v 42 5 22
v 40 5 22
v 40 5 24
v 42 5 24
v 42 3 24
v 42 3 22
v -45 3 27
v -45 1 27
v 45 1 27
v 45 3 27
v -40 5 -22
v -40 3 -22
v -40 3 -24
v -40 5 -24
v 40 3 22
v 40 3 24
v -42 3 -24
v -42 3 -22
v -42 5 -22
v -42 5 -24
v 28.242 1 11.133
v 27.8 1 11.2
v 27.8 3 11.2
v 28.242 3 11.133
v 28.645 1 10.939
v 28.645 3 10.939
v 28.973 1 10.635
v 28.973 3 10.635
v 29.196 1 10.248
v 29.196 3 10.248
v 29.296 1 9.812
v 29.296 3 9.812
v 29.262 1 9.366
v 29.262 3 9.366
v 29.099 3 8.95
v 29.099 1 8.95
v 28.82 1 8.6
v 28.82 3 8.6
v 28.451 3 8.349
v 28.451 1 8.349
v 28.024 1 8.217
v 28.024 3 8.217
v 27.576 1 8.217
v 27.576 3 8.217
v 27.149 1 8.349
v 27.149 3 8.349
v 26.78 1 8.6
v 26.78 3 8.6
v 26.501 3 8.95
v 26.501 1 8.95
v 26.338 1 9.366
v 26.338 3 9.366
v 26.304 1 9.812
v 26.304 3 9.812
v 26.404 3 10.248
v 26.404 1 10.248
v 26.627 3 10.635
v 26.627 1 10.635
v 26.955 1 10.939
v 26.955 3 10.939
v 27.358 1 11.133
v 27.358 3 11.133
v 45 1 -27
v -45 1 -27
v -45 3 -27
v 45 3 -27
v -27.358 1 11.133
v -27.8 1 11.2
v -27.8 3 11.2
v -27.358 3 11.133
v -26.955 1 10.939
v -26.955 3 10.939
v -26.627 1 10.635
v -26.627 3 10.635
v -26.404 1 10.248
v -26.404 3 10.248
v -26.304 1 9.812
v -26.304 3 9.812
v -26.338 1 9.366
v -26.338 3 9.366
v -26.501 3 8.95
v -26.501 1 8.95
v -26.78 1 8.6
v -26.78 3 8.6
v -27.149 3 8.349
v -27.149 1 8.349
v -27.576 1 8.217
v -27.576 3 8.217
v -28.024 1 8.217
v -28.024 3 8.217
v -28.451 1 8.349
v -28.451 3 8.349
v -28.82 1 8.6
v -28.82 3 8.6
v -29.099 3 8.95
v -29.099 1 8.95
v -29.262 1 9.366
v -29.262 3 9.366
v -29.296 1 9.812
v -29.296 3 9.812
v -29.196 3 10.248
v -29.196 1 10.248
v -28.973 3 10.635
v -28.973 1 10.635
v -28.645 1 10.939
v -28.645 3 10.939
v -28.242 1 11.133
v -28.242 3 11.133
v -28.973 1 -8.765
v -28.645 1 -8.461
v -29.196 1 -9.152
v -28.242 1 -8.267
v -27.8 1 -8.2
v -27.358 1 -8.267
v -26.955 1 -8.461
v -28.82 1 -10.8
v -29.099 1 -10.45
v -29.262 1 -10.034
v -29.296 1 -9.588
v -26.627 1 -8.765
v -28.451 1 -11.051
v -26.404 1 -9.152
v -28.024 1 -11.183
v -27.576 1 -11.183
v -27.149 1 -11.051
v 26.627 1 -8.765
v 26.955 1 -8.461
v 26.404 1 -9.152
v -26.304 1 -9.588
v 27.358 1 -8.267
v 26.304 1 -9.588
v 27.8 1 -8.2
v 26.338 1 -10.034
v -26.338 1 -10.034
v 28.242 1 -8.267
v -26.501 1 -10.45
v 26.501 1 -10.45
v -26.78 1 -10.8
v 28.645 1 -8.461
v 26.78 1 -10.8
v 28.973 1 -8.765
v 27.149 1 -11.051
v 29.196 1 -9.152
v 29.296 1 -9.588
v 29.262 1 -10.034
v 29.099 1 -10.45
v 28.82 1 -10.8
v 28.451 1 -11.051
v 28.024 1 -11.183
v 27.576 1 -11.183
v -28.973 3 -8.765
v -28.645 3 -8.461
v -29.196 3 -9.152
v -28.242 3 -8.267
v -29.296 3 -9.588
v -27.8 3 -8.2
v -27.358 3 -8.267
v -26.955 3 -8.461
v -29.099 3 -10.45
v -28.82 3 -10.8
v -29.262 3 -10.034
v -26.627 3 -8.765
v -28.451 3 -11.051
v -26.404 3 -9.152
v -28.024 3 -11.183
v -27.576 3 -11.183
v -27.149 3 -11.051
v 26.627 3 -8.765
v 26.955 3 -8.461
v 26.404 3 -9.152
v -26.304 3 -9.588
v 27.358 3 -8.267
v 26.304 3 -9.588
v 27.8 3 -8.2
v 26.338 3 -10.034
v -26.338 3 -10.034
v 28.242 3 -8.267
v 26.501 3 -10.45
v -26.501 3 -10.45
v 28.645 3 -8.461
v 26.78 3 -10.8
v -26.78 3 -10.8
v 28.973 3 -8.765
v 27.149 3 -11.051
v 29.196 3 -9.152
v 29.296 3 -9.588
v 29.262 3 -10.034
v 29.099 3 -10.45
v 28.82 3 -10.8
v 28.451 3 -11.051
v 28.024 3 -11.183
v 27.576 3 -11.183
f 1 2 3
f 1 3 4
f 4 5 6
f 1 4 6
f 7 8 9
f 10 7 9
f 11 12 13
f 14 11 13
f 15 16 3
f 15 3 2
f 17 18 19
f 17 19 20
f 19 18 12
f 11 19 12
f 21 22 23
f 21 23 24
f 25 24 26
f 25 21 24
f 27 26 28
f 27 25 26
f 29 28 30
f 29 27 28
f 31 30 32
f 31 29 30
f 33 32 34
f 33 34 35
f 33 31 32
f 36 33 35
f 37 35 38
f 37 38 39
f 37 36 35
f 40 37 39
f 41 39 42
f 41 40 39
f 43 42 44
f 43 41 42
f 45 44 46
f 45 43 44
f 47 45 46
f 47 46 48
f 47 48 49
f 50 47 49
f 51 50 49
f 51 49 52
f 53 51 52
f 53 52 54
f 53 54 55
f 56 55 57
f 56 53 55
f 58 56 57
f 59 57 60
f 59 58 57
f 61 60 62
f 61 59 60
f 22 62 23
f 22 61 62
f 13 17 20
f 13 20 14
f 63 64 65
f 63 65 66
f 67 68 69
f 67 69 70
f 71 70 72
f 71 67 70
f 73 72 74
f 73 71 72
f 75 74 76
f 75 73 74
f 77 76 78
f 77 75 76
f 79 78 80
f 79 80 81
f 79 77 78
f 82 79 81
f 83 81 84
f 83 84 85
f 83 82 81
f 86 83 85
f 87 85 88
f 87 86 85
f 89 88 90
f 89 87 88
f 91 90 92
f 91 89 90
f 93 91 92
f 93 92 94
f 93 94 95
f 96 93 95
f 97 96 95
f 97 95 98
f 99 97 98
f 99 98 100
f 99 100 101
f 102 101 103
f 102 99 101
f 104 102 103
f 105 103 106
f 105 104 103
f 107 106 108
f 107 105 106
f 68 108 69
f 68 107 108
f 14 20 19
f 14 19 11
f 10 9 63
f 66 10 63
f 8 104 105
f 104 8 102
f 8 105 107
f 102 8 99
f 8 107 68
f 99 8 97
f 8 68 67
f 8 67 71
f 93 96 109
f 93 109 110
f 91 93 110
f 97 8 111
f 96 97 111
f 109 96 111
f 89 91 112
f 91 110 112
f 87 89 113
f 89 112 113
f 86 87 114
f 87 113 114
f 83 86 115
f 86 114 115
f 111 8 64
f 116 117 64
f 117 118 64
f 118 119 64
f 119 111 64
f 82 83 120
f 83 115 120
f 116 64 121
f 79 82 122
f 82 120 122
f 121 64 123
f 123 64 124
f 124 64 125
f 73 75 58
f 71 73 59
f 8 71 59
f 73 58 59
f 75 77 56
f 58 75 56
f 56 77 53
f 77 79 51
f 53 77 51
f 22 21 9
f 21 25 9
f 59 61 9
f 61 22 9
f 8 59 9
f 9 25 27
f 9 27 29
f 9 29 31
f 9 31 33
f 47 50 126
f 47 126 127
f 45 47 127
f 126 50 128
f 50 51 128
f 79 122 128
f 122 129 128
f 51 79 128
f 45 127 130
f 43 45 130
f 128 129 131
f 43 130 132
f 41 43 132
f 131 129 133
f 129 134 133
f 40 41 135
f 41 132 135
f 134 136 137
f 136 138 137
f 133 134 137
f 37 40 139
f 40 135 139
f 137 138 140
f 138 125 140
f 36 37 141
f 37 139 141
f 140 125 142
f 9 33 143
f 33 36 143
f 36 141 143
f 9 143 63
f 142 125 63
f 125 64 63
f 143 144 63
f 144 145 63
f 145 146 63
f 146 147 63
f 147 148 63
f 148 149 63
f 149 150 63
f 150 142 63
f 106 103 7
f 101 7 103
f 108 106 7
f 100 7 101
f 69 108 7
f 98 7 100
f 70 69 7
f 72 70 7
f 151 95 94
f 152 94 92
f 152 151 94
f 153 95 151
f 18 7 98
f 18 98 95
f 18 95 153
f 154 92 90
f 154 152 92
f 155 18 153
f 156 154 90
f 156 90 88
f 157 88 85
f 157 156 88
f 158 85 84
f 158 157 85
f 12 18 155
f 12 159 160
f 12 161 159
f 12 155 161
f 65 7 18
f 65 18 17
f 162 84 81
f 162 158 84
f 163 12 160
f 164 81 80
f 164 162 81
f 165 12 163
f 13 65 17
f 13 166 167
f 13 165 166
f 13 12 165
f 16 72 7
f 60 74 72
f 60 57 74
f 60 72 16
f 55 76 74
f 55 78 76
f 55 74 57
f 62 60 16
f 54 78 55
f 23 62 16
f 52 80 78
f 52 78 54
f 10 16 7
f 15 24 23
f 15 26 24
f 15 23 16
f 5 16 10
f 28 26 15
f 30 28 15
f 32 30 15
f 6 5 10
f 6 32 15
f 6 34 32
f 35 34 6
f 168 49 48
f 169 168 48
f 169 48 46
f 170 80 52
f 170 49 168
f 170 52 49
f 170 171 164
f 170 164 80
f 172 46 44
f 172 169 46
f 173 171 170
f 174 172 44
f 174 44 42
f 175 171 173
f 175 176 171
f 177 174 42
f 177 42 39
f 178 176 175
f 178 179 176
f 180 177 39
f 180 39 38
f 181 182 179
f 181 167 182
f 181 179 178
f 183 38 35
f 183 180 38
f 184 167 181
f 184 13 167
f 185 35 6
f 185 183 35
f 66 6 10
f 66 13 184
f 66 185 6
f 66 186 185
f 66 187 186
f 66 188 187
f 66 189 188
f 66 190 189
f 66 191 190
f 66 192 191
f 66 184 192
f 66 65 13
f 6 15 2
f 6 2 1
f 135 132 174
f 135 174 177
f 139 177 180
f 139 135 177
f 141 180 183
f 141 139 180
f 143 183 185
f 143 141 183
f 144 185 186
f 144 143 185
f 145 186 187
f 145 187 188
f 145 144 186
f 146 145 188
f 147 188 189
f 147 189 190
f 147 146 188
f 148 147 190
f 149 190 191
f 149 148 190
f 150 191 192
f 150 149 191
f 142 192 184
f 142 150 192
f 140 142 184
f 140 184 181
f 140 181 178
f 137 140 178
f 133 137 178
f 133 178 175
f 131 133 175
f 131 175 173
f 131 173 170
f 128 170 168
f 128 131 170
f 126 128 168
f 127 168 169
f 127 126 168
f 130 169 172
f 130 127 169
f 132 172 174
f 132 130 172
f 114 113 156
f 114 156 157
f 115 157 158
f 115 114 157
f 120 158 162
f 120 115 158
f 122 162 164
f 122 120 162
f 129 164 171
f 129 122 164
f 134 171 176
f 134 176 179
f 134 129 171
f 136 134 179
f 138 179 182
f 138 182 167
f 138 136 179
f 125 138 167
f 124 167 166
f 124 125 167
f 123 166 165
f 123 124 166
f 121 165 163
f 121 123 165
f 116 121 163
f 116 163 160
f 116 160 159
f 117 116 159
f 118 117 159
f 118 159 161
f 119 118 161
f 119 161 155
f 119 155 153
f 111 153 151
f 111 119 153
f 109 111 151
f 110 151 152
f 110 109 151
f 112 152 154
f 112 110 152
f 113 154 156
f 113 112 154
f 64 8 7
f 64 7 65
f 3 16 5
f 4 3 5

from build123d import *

# Parameters (mm, degrees)
SKETCH2_W           = 90
SKETCH2_H           = 54
SKETCH2_R           = 1.5
BOSS_EXTRUDE1_DEPTH = 2
SKETCH2_4_W         = 2
SKETCH2_4_H         = 2
BOSS_EXTRUDE3_DEPTH = 4


with BuildPart() as part:
    # Sketch2 → Boss-Extrude1 (new body)
    with BuildSketch(Plane(origin=(0, 1, 0), x_dir=(1, 0, 0), z_dir=(0, 1, 0))):
        Rectangle(SKETCH2_W, SKETCH2_H)
        with Locations((-27.8, 9.7)):
            Circle(SKETCH2_R, mode=Mode.SUBTRACT)
        with Locations((-27.8, -9.7)):
            Circle(SKETCH2_R, mode=Mode.SUBTRACT)
        with Locations((27.8, -9.7)):
            Circle(SKETCH2_R, mode=Mode.SUBTRACT)
        with Locations((27.8, 9.7)):
            Circle(SKETCH2_R, mode=Mode.SUBTRACT)
    extrude(amount=BOSS_EXTRUDE1_DEPTH)

    # Sketch2<4> → Boss-Extrude3 (add)
    with BuildSketch(Plane(origin=(0, 1, 0), x_dir=(1, 0, 0), z_dir=(0, 1, 0))):
        with Locations((41, -23)):
            Rectangle(SKETCH2_4_W, SKETCH2_4_H)
        with Locations((-41, 23)):
            Rectangle(SKETCH2_4_W, SKETCH2_4_H)
    extrude(amount=BOSS_EXTRUDE3_DEPTH)


solid = part.part
